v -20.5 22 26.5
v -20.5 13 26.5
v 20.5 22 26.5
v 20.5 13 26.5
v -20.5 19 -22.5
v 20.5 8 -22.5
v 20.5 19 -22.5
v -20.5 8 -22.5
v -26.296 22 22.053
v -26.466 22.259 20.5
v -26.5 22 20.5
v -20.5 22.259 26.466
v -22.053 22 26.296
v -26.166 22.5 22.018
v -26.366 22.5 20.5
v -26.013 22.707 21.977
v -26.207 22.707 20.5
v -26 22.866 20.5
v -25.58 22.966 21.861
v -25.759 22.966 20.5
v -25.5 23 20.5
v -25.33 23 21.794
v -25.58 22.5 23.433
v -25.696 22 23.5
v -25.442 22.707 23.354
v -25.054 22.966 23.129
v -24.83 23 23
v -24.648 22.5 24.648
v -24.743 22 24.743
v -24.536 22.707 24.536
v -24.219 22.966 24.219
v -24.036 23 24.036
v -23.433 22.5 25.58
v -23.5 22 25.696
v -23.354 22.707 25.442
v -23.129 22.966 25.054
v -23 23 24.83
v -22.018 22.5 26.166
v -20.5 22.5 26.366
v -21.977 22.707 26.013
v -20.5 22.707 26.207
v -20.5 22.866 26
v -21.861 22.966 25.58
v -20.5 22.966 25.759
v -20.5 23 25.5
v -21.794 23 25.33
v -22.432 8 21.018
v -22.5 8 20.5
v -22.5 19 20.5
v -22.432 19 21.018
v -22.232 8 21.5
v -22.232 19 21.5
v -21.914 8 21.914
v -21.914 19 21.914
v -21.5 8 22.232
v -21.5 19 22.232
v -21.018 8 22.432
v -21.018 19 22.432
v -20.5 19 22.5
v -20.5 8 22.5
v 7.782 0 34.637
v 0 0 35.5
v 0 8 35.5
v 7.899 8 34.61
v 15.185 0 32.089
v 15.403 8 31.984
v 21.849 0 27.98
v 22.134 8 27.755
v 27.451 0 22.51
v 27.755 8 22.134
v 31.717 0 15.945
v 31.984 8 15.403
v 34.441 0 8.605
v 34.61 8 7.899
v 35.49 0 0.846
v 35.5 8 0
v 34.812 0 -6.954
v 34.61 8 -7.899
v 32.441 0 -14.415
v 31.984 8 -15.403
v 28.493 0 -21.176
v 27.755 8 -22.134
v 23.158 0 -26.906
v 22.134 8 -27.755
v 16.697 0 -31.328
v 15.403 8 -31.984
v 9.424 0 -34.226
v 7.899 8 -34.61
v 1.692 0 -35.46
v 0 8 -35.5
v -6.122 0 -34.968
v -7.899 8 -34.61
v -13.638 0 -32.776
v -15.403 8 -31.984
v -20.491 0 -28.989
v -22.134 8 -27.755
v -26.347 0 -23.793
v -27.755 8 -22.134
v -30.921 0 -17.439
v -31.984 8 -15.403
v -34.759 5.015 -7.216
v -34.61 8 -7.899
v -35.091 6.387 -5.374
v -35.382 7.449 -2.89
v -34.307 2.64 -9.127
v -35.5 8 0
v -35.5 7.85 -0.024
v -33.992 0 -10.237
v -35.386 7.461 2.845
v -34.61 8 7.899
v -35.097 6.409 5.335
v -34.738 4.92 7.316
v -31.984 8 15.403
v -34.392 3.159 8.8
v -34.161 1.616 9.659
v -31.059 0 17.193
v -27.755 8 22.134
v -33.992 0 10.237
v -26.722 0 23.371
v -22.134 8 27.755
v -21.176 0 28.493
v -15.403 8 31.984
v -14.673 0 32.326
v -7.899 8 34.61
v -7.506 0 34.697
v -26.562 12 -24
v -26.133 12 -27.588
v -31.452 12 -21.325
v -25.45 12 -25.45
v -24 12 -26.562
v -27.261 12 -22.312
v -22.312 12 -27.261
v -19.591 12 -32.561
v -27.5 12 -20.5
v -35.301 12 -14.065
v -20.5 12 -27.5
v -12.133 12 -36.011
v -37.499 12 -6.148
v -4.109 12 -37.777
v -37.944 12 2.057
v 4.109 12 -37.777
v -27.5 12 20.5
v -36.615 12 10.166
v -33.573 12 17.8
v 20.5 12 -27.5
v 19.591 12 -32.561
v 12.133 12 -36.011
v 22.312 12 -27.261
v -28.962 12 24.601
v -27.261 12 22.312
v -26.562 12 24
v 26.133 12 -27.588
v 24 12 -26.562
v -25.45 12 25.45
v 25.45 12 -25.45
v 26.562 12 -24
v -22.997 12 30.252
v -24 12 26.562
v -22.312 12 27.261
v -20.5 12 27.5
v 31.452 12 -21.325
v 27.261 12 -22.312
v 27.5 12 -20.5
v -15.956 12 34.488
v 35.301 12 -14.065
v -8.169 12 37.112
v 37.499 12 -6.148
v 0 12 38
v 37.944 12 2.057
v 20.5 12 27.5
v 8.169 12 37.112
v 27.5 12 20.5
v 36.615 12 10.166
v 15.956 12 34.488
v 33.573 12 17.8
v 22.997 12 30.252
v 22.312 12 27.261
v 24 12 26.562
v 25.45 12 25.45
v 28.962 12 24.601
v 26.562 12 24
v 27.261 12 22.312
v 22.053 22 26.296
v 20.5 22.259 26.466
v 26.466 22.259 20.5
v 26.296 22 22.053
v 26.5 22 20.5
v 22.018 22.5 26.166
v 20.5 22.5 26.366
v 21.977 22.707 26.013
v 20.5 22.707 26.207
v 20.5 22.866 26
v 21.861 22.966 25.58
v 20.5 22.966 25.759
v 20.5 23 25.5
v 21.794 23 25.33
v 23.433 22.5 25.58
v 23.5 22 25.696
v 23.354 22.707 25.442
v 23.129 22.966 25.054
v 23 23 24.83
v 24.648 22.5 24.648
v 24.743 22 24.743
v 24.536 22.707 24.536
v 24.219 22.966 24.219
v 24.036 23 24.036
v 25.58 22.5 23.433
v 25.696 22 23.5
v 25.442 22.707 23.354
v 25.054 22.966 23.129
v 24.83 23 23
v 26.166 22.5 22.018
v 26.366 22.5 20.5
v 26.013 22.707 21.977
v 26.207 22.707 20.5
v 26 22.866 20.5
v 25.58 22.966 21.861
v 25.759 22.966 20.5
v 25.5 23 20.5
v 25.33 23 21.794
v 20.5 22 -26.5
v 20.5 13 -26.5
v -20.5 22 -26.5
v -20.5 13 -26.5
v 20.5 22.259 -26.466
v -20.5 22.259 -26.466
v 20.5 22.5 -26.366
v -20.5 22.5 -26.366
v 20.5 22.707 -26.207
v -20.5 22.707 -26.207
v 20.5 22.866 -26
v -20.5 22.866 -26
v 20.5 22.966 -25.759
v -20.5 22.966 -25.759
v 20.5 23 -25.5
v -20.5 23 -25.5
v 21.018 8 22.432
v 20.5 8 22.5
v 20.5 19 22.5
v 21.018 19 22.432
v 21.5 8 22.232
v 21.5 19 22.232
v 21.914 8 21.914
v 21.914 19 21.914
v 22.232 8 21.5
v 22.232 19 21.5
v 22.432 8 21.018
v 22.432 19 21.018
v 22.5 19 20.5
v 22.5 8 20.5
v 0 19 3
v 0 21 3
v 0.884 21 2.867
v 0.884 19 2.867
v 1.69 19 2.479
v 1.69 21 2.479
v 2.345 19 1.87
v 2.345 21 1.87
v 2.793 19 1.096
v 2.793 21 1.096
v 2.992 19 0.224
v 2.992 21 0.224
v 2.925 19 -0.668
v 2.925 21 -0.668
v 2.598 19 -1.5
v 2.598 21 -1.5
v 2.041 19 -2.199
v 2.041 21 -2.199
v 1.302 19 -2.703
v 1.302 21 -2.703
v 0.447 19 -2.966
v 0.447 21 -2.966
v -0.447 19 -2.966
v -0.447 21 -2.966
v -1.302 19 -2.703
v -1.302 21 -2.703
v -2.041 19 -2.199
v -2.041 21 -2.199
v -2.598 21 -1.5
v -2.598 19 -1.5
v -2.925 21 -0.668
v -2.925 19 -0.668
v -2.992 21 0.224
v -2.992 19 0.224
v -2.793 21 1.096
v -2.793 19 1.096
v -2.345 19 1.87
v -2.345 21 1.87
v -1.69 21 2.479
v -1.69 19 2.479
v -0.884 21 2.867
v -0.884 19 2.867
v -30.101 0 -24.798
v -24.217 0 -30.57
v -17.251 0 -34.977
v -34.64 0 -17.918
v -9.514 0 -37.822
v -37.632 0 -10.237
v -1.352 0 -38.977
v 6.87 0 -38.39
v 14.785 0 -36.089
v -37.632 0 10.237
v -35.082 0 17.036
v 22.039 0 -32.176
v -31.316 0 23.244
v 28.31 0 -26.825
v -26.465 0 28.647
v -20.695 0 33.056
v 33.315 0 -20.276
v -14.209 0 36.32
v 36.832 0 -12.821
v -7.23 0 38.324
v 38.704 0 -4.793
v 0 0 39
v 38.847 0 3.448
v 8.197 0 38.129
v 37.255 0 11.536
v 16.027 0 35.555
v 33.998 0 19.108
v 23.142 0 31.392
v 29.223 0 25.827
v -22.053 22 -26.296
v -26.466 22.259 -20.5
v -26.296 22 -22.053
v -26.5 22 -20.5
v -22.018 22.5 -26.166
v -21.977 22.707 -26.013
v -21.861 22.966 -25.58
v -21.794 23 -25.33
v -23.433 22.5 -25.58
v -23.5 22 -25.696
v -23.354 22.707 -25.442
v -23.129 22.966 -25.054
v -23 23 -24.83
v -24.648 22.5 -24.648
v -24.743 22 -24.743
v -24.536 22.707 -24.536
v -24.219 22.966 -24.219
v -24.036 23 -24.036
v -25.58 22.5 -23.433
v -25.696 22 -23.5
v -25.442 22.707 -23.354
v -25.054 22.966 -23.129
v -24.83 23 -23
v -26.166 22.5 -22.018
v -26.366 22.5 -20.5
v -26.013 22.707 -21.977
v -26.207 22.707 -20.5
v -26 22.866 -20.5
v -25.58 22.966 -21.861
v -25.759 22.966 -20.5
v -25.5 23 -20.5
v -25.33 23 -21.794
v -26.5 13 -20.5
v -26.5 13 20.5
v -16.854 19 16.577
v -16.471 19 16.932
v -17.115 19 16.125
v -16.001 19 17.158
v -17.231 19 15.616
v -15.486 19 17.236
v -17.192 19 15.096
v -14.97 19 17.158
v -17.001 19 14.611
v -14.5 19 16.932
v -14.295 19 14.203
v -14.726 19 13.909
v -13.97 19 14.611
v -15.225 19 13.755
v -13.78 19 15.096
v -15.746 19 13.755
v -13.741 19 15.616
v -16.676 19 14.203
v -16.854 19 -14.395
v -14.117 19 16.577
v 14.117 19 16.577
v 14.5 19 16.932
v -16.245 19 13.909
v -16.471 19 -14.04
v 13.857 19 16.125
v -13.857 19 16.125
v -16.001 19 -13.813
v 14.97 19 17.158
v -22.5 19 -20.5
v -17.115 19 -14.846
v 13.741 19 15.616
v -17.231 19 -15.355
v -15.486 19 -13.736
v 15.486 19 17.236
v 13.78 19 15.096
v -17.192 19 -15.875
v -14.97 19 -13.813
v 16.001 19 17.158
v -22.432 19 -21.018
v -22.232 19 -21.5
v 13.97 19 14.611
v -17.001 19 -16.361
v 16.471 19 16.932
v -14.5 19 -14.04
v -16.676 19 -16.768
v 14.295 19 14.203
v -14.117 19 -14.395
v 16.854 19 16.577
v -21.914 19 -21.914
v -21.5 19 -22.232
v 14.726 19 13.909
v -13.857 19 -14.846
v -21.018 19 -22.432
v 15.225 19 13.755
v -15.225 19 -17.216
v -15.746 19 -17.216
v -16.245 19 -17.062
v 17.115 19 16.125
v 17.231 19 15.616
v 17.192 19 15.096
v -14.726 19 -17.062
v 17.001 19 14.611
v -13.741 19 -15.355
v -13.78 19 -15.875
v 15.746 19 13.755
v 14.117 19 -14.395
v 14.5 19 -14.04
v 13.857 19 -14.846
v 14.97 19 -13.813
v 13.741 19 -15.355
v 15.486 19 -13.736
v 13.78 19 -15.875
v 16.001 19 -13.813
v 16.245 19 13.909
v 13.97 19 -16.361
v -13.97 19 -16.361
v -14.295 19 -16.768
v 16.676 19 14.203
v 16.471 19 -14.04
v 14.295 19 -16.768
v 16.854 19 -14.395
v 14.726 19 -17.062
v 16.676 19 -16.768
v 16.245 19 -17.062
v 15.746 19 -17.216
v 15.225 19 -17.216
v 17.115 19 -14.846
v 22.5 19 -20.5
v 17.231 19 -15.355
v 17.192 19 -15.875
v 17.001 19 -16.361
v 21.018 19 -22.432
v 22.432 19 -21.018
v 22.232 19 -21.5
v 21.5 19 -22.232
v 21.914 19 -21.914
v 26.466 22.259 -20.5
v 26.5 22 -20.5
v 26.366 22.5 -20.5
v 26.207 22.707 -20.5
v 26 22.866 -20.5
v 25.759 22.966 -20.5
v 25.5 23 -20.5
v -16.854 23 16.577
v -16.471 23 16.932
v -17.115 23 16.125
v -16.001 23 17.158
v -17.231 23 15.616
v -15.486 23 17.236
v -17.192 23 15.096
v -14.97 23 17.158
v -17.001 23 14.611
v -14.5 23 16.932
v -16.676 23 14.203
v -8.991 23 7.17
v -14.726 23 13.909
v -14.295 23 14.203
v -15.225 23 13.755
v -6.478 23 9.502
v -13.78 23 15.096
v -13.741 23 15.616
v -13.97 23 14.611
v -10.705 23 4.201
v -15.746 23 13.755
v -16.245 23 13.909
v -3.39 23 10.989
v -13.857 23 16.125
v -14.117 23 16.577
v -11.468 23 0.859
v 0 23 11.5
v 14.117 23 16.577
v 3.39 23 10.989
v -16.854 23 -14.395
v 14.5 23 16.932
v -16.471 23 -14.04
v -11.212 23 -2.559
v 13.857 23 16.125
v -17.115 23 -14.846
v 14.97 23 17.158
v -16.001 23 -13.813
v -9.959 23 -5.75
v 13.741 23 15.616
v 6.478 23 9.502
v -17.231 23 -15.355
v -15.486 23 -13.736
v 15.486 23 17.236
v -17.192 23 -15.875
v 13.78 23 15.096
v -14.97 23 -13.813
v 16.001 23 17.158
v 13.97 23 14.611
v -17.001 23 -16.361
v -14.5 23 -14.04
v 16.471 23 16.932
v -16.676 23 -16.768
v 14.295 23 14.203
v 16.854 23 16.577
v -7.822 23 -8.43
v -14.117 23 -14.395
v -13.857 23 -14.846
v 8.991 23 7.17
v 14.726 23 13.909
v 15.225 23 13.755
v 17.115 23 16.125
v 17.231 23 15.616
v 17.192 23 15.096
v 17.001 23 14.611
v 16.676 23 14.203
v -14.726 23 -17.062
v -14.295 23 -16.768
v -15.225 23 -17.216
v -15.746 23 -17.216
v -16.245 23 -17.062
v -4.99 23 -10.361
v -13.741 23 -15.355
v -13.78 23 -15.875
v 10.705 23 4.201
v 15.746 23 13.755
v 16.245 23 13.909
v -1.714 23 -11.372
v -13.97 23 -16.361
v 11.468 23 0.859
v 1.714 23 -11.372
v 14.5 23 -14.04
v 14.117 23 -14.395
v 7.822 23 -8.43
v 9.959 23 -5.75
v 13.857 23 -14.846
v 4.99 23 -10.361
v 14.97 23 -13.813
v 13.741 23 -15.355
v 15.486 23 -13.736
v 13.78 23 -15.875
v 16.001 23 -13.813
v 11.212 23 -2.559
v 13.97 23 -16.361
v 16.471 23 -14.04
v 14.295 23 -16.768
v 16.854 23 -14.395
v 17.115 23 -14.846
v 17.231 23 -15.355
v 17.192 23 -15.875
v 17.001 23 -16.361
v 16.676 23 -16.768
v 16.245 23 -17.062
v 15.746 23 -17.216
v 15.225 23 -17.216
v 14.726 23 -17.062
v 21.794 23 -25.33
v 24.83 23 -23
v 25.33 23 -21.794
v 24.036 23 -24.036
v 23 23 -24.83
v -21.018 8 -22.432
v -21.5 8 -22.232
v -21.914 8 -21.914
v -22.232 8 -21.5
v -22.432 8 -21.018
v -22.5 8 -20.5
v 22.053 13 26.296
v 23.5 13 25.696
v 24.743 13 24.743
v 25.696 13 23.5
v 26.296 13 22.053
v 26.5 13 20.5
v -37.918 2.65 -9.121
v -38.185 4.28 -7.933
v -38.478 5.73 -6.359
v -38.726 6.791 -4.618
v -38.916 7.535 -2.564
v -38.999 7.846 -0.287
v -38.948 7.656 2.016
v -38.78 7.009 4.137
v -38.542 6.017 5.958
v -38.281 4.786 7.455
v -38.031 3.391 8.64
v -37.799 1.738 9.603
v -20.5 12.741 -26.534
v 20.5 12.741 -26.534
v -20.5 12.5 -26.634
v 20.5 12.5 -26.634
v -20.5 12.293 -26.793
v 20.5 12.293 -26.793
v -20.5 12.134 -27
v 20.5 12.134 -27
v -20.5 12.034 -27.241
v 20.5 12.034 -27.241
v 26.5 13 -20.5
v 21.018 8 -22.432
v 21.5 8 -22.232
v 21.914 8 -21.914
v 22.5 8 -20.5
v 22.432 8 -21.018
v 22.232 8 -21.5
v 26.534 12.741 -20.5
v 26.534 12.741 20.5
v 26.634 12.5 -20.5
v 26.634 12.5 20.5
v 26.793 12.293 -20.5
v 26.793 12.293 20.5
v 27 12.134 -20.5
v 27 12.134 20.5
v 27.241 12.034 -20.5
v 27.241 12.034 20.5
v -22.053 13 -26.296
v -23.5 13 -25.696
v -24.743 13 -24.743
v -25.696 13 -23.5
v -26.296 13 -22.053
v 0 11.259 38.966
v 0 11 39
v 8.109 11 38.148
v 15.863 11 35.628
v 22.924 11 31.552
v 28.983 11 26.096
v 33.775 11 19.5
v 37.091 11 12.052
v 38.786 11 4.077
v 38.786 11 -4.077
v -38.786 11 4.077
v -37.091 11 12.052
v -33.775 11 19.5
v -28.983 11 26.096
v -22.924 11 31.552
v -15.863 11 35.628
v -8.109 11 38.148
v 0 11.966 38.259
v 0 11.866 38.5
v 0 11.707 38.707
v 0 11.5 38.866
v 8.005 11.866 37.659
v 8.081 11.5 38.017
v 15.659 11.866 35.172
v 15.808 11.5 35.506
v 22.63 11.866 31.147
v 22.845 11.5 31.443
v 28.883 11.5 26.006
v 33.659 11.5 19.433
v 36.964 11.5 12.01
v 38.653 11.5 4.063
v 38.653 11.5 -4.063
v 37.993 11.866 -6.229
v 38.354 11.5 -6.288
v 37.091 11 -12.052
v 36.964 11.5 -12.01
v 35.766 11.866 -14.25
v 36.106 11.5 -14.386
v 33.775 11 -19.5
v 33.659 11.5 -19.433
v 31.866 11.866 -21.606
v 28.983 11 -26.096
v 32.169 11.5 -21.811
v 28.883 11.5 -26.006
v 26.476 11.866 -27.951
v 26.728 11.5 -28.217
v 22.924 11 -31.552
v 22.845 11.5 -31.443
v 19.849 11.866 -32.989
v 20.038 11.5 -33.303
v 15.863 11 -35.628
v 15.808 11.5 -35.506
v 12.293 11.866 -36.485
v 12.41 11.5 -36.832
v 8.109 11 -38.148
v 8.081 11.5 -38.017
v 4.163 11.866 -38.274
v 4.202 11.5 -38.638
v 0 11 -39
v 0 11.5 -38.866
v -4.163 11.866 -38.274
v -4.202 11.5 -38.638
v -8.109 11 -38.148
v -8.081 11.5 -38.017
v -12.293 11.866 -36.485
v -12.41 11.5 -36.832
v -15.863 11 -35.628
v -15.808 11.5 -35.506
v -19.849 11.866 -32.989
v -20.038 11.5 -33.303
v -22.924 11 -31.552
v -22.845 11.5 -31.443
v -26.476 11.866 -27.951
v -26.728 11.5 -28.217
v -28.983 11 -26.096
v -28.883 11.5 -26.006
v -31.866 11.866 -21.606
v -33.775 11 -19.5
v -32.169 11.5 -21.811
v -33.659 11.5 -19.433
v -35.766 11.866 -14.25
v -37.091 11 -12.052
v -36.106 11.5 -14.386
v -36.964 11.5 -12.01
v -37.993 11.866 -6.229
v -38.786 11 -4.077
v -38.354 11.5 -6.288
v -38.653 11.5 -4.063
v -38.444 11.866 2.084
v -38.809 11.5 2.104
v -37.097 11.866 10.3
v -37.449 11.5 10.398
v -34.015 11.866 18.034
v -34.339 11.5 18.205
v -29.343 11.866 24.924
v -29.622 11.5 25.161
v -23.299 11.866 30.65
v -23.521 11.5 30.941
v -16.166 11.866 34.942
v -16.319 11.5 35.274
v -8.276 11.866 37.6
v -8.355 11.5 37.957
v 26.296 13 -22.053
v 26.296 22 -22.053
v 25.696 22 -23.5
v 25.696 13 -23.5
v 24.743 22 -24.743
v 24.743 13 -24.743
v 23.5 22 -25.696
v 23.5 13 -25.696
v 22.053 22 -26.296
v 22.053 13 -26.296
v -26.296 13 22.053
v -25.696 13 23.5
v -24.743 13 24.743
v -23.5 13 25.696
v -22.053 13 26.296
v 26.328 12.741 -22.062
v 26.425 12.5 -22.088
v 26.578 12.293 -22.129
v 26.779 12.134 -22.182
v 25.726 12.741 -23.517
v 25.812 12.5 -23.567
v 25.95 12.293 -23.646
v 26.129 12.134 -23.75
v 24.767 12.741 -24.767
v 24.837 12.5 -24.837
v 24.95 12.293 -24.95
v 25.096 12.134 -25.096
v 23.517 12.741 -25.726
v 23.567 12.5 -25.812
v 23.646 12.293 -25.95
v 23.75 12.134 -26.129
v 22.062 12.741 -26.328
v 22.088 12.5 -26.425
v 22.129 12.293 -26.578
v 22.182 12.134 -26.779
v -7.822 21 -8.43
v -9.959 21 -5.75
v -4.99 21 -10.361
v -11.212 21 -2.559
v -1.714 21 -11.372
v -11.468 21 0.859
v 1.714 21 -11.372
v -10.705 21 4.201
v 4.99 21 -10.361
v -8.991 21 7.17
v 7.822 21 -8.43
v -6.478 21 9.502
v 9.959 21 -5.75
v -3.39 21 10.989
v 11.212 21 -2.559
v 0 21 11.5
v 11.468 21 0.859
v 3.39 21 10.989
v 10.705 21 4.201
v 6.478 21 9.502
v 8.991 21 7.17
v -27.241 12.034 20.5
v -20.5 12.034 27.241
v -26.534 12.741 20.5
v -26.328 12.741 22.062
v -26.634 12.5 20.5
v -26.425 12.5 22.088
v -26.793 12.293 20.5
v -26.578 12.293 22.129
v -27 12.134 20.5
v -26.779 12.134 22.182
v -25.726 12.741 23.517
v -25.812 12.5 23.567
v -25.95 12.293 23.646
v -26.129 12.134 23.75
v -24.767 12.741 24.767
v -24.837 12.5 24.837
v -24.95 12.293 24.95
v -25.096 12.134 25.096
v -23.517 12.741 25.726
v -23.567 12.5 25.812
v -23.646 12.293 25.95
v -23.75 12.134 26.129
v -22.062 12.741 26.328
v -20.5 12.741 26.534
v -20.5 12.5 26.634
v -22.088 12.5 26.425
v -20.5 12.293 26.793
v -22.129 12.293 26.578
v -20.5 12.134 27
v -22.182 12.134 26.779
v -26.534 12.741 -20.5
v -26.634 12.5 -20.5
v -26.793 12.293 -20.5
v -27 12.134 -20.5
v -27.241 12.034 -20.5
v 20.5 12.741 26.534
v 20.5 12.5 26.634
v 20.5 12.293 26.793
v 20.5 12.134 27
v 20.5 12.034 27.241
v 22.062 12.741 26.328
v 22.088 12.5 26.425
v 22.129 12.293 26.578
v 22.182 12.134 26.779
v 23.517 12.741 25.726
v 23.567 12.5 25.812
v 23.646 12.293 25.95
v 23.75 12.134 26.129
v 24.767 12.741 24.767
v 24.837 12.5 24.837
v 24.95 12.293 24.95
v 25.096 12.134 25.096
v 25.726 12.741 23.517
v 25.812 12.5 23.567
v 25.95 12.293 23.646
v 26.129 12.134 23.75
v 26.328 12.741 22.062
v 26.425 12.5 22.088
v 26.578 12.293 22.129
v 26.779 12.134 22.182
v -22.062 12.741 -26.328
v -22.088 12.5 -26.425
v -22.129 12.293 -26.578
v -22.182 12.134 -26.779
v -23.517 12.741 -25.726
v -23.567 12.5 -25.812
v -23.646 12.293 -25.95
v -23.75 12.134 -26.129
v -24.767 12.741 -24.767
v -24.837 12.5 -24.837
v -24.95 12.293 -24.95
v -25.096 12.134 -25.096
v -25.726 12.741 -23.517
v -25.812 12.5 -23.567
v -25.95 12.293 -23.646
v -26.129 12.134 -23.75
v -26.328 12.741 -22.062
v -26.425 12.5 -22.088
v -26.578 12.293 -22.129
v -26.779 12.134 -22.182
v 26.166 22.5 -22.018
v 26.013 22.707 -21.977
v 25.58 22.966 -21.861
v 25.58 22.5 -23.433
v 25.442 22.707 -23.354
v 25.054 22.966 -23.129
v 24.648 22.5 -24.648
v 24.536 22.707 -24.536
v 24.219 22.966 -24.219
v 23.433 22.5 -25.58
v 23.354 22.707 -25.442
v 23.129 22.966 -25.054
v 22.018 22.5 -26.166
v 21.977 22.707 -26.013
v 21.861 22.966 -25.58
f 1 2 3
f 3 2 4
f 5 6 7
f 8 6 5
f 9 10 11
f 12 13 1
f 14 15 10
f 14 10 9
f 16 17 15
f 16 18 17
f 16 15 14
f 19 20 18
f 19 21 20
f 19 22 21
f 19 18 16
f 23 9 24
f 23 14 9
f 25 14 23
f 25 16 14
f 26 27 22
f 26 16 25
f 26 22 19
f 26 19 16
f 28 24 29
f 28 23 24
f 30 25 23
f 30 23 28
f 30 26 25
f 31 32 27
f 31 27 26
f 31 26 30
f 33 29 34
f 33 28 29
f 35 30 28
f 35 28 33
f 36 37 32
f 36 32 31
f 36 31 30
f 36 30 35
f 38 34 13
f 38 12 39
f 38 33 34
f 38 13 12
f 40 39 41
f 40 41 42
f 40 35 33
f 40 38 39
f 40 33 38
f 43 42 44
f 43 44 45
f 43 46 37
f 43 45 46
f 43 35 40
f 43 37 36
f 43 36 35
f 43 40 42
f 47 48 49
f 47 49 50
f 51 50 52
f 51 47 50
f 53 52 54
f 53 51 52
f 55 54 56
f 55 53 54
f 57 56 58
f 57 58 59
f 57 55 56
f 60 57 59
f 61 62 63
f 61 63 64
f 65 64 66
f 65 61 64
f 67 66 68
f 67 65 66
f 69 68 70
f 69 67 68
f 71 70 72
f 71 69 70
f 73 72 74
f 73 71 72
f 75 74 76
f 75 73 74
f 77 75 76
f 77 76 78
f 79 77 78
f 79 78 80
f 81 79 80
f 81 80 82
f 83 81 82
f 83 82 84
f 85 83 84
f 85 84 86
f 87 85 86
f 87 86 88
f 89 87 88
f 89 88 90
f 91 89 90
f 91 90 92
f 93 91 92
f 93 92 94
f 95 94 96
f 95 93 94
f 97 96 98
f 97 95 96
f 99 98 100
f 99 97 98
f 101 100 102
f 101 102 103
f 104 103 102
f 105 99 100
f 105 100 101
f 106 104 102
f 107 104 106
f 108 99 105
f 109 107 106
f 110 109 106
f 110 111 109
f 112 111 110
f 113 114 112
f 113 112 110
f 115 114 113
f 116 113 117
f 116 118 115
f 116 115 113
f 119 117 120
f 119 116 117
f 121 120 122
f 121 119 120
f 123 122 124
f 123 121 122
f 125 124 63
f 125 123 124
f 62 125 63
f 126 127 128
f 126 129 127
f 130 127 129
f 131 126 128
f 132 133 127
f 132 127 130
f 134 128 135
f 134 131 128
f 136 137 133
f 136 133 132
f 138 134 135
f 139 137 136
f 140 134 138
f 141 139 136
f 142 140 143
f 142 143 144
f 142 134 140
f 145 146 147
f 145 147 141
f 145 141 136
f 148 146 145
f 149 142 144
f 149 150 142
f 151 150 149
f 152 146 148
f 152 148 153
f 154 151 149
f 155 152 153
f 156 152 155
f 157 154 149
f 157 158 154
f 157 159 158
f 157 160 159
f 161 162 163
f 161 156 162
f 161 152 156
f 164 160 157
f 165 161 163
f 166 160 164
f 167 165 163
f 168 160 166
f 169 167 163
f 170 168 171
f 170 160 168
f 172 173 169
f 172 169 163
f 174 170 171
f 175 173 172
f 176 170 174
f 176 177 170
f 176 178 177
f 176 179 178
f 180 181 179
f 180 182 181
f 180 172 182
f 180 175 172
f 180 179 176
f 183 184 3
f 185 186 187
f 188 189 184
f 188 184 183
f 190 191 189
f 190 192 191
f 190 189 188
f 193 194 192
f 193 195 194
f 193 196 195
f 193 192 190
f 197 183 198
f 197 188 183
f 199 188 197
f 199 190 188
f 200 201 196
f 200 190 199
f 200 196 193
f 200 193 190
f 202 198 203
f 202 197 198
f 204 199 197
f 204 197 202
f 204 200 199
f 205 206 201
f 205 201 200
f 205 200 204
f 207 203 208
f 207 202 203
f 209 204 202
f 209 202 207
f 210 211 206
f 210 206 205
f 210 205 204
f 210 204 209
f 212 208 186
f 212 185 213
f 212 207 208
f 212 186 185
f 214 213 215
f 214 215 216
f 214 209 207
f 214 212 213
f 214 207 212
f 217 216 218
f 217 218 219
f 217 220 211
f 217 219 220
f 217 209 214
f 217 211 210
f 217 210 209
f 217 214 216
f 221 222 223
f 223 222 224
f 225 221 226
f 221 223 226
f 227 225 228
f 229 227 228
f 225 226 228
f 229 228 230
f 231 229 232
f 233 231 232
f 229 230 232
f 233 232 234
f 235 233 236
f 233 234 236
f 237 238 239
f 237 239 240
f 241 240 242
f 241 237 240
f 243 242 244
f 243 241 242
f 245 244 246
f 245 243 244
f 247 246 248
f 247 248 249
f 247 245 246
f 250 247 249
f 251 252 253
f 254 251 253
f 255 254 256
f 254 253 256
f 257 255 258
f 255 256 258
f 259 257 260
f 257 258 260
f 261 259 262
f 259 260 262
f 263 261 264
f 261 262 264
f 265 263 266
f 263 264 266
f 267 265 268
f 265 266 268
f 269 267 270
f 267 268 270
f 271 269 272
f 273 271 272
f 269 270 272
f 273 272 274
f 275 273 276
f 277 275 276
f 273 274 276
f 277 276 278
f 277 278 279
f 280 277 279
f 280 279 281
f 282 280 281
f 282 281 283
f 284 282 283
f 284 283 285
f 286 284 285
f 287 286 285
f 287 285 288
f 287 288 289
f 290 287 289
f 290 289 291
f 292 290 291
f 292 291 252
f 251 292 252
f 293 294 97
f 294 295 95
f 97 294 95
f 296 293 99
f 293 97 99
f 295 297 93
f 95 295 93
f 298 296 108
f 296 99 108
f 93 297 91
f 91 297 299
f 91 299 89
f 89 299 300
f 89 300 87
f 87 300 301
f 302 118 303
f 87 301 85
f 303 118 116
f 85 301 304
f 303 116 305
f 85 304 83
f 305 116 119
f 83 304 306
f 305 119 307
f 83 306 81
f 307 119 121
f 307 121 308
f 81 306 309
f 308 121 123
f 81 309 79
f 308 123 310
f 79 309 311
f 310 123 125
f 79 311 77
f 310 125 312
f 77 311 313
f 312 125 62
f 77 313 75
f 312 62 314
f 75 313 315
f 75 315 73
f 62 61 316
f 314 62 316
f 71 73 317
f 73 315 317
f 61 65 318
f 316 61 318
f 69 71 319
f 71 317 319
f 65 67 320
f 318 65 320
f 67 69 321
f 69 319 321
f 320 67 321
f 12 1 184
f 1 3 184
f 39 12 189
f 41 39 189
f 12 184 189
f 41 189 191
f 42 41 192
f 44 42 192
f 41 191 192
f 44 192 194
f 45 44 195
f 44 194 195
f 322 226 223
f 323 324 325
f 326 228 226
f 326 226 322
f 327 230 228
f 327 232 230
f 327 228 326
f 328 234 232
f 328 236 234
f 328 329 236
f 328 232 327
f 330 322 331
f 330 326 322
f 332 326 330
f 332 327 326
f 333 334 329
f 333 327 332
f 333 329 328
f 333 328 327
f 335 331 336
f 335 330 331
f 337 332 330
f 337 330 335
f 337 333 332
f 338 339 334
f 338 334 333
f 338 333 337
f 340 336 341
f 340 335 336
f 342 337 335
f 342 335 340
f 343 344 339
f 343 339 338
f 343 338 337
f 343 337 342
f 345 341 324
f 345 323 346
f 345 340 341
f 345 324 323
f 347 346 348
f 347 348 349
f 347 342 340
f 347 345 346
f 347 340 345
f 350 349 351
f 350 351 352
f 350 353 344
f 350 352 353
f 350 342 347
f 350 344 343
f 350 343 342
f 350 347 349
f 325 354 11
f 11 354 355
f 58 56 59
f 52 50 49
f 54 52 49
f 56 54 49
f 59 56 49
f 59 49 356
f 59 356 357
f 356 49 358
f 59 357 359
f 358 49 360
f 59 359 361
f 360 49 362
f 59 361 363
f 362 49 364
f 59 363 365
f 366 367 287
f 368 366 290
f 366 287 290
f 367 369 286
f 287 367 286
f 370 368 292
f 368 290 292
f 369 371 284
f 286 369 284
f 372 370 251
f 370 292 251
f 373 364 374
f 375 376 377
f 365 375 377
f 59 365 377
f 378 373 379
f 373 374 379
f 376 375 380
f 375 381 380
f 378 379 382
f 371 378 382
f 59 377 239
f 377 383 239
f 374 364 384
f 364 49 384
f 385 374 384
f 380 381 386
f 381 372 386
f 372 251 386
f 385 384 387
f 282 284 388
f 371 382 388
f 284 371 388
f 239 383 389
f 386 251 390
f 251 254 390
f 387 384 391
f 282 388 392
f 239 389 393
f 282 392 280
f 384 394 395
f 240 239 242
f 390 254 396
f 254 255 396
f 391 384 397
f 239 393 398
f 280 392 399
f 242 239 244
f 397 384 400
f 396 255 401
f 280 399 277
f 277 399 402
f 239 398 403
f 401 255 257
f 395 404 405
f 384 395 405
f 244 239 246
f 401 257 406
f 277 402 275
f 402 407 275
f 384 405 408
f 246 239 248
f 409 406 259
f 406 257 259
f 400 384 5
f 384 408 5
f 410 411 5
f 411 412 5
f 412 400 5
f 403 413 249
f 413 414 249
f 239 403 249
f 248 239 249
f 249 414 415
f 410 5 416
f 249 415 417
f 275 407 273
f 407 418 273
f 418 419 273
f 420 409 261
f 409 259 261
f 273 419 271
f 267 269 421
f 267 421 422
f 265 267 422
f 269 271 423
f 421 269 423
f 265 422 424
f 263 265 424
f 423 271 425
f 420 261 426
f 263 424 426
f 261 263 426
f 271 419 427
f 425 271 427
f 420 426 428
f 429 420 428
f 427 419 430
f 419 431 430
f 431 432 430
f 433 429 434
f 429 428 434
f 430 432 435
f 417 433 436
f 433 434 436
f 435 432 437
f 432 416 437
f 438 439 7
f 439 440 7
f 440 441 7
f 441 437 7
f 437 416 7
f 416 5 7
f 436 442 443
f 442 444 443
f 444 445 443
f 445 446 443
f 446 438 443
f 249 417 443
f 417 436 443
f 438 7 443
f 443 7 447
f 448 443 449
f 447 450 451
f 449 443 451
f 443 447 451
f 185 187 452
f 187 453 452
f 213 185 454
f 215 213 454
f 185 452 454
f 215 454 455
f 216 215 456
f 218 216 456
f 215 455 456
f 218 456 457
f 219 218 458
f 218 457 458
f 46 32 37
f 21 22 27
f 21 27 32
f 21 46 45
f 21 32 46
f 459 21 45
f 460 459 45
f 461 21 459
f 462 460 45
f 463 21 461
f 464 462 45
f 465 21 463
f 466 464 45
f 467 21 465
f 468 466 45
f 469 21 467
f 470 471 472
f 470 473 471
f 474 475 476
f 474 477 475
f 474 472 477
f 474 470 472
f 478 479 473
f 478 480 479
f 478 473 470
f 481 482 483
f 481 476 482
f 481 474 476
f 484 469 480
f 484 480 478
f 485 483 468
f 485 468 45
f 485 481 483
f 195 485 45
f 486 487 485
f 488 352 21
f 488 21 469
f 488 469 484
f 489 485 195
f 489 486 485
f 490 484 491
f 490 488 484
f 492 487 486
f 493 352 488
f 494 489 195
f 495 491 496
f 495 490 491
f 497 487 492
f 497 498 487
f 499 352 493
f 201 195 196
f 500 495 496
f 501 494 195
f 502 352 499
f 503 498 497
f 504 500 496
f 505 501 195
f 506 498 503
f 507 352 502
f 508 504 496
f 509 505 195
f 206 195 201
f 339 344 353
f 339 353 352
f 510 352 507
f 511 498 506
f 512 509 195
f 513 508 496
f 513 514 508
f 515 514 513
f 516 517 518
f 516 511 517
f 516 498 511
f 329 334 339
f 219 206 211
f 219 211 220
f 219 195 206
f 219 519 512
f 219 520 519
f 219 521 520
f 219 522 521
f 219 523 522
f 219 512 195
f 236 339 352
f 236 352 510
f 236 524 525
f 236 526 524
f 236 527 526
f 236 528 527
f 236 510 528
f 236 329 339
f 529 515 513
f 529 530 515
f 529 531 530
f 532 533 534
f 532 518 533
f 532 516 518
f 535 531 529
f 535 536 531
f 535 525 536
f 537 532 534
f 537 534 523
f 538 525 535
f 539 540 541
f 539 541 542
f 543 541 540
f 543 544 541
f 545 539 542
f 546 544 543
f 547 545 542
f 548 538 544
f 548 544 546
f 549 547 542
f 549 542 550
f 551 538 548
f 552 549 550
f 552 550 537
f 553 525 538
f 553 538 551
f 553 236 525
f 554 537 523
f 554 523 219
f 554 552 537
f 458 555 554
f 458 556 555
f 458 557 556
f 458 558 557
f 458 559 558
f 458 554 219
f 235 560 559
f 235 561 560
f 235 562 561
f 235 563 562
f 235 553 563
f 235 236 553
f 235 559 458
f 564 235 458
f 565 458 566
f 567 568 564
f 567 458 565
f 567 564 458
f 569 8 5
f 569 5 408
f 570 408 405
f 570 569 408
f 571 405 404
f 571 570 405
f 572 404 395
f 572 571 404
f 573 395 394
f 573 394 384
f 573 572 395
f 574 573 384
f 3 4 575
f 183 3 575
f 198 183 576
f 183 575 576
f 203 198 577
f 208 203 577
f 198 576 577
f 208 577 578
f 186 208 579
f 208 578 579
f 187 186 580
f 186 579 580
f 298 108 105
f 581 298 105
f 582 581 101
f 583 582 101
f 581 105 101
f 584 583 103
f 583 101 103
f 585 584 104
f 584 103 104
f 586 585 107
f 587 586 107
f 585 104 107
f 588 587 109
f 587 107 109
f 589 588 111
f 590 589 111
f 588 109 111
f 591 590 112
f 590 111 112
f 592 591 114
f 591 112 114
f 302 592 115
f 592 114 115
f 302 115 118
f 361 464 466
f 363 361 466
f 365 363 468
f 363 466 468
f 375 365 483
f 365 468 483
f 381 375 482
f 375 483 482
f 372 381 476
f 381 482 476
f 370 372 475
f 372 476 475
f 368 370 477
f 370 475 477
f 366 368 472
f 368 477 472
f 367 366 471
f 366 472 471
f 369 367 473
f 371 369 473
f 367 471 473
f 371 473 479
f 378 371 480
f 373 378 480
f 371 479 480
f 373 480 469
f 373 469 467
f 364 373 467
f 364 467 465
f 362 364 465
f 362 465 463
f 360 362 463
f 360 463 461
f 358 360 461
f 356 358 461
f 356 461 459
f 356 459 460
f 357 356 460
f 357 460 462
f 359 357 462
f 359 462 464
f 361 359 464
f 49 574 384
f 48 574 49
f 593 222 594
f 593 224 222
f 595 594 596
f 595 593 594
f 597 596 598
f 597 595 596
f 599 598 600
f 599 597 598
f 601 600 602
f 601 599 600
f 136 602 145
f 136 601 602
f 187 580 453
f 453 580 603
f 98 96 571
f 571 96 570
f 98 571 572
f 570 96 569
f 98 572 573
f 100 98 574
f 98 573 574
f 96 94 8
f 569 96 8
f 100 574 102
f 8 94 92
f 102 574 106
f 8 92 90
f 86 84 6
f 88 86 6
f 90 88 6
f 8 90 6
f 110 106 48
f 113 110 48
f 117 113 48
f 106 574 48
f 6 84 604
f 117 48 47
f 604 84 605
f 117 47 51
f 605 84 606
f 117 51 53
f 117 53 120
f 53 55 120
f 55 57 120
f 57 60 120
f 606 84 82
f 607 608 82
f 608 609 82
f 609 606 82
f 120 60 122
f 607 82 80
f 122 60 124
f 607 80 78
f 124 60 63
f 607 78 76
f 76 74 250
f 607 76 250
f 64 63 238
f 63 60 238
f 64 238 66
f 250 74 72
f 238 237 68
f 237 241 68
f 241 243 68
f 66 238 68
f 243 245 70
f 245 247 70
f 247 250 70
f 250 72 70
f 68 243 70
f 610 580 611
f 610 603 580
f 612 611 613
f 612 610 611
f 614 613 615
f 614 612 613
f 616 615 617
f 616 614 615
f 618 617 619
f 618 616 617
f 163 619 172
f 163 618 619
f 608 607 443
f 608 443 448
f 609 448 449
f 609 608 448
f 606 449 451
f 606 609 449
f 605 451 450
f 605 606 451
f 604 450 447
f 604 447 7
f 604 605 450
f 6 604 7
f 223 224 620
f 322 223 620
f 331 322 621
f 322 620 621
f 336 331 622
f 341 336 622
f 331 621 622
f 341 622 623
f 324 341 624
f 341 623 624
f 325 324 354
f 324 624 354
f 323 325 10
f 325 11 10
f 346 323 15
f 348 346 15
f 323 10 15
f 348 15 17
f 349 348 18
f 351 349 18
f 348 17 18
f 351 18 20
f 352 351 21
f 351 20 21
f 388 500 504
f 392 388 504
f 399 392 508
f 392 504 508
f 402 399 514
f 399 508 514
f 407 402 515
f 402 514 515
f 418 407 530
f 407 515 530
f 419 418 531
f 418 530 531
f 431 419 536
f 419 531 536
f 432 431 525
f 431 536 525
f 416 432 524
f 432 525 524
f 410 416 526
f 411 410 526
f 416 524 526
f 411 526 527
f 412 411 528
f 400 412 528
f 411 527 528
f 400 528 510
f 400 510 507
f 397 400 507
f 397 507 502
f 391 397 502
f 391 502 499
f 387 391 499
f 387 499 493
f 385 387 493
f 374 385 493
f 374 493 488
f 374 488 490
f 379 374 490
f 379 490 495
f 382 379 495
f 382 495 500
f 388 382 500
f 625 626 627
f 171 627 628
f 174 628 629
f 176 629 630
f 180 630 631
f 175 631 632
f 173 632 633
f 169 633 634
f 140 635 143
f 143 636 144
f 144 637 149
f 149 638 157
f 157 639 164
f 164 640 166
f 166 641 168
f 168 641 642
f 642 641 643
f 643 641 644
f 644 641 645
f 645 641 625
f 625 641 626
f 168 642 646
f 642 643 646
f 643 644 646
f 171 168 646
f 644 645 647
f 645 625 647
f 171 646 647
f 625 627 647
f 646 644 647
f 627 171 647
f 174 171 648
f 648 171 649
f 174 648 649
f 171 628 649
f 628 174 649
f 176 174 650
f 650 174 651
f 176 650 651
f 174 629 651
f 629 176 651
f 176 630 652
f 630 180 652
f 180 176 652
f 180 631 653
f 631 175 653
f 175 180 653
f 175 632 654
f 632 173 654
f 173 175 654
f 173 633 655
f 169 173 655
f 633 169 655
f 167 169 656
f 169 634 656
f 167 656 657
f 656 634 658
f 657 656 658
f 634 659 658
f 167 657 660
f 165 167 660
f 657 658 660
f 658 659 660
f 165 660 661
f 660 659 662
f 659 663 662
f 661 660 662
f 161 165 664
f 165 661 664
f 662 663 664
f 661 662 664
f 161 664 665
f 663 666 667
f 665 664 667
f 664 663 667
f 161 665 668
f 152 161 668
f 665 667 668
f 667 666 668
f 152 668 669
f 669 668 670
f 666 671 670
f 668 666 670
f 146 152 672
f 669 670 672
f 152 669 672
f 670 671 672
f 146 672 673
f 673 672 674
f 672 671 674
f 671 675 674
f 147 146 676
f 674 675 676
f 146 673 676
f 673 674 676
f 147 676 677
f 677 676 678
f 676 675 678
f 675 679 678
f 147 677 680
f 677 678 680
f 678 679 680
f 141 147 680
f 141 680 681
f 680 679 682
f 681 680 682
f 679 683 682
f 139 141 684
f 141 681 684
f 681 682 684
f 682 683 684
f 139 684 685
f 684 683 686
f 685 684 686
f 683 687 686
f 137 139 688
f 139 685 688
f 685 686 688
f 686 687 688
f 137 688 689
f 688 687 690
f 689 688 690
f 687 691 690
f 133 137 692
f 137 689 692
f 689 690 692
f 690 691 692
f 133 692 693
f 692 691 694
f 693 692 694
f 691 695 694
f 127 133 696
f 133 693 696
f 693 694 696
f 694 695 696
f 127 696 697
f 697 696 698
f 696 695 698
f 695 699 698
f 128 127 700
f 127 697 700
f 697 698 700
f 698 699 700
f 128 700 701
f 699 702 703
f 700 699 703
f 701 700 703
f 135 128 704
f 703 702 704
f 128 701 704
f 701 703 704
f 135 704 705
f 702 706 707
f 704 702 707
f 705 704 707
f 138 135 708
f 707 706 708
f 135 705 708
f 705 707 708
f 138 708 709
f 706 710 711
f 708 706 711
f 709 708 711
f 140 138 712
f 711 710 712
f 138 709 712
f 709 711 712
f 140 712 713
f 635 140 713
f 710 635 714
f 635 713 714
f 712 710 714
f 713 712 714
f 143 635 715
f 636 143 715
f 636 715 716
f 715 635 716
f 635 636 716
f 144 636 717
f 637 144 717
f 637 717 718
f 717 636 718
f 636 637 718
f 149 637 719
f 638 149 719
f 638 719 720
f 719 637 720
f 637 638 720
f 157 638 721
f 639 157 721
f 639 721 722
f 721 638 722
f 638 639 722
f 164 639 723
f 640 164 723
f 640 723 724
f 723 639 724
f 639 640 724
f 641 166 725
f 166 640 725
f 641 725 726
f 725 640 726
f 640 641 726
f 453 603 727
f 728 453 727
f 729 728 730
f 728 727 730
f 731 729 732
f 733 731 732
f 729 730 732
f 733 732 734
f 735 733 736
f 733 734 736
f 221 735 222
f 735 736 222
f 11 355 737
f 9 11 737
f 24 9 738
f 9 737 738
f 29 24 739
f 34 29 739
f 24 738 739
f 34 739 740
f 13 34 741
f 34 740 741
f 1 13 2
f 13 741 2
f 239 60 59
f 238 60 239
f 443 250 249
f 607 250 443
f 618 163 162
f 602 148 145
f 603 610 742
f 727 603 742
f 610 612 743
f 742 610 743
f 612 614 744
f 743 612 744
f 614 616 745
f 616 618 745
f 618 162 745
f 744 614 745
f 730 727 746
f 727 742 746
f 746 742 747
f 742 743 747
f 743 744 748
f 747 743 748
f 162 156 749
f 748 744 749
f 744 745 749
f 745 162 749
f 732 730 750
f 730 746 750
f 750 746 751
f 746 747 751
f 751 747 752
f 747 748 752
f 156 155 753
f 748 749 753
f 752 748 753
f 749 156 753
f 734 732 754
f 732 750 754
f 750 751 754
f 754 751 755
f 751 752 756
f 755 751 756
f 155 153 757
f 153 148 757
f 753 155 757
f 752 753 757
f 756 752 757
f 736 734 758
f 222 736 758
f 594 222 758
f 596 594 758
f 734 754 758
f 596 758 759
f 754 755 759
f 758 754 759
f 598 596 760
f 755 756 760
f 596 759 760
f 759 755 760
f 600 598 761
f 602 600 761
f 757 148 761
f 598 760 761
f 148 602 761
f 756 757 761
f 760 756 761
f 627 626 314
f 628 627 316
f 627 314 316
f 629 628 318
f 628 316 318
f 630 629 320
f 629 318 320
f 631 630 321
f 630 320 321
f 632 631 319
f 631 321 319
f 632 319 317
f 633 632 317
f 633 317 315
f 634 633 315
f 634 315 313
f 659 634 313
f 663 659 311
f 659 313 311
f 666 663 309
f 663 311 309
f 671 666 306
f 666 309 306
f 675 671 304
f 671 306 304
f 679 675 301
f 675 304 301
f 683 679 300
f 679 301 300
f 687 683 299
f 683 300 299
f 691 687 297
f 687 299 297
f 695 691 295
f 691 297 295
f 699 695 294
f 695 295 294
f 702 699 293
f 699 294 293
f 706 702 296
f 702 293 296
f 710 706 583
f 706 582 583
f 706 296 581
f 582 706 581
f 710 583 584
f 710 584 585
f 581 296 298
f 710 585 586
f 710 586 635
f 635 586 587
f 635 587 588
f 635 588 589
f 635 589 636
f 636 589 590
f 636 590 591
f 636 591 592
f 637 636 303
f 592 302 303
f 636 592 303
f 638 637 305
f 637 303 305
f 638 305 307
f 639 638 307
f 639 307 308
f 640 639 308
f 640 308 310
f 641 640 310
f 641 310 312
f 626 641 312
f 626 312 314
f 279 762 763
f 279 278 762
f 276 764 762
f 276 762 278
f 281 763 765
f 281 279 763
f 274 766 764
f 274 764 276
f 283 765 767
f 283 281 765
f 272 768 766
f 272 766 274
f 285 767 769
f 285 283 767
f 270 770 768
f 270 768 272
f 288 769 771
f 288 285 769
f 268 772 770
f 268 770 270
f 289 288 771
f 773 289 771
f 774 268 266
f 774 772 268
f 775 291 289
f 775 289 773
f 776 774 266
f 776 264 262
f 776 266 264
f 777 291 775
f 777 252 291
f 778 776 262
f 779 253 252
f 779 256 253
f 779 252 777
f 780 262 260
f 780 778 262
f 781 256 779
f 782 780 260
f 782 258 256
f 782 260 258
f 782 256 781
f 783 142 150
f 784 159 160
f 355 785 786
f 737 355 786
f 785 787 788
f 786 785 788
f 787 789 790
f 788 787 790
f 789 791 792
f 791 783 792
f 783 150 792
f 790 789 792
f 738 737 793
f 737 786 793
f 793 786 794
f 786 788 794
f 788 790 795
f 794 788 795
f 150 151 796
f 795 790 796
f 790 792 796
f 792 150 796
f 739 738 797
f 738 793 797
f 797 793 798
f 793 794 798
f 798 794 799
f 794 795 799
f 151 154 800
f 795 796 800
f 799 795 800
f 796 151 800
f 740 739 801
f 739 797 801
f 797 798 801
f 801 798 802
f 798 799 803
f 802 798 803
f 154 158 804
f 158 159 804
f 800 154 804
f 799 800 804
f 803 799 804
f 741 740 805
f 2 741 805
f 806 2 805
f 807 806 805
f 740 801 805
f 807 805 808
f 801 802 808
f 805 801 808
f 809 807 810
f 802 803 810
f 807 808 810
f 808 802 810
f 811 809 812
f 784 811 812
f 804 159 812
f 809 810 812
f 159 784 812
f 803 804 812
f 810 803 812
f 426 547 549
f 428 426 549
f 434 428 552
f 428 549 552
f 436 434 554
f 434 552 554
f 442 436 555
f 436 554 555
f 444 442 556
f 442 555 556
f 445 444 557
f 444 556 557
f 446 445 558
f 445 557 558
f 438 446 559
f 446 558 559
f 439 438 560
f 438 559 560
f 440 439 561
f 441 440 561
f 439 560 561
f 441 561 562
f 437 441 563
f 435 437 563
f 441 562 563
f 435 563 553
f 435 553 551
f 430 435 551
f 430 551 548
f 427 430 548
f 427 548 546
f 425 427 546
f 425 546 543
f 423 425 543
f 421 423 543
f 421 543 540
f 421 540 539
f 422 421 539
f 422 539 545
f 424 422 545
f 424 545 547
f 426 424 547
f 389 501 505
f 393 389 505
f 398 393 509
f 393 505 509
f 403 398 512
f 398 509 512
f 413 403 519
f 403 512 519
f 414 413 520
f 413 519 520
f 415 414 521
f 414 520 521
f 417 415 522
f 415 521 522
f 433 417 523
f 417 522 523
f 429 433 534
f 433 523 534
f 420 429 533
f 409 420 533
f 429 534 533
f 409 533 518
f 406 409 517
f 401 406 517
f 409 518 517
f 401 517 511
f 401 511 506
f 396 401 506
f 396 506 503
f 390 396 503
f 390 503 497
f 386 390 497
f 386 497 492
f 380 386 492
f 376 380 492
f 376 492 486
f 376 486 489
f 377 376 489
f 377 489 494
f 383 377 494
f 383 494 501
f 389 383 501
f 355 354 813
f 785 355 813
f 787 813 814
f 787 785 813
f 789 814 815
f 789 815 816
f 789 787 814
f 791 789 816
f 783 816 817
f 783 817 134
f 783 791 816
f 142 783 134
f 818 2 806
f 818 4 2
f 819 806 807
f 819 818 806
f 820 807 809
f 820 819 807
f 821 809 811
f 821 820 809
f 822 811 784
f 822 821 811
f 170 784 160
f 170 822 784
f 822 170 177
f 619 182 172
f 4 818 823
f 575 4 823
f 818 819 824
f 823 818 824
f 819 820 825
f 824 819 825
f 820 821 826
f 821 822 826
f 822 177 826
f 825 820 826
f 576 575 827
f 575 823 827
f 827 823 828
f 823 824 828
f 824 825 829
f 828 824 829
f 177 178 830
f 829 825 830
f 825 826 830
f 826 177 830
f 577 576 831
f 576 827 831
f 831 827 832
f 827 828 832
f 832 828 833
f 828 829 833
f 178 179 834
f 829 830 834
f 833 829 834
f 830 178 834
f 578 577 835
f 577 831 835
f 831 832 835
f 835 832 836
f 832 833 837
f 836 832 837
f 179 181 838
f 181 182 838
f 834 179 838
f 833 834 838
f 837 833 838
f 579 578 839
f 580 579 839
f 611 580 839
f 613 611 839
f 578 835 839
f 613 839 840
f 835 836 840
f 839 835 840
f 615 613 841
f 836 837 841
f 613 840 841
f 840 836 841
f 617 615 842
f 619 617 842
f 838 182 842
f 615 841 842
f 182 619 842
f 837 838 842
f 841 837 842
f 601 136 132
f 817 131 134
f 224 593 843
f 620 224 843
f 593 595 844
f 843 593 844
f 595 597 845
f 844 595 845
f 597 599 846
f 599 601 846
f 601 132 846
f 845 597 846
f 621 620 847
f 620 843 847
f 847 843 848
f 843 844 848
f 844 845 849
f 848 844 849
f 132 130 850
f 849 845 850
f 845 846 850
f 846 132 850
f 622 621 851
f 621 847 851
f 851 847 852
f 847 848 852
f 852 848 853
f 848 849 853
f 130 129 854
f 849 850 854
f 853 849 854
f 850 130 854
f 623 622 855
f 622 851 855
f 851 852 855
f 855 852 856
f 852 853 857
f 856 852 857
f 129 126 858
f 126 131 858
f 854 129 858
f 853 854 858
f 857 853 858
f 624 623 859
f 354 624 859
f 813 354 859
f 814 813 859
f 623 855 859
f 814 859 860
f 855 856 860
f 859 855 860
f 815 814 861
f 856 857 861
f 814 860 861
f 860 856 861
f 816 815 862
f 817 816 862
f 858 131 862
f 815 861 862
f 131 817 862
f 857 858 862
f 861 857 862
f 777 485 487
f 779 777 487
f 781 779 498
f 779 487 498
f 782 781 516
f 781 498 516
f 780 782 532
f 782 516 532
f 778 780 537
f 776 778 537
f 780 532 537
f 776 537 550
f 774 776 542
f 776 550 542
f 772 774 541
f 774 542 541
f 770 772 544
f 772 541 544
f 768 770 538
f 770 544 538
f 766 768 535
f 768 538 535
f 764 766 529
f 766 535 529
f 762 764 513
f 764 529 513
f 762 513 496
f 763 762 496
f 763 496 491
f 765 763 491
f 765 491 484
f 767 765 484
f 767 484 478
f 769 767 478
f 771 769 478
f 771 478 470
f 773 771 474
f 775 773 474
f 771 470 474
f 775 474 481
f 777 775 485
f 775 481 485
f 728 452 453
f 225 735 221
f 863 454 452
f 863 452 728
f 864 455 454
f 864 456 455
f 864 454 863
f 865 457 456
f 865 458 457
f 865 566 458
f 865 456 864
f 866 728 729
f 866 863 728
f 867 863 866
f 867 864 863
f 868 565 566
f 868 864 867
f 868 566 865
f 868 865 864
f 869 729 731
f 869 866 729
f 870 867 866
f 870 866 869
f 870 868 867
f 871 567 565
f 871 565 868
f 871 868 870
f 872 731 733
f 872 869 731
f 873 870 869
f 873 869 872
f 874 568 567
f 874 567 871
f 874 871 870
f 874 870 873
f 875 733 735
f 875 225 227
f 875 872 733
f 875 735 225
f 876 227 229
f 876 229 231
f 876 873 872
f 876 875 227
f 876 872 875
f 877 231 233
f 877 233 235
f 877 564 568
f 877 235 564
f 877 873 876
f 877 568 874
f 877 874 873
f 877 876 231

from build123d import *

# Parameters (mm, degrees)
SKETCH1_R           = 39
SKETCH1_R_2         = 35.5
BOSS_EXTRUDE1_DEPTH = 8
SKETCH2_R           = 39
BOSS_EXTRUDE2_DEPTH = 4
BOSS_EXTRUDE3_DEPTH = 7
BOSS_EXTRUDE4_DEPTH = 4
SKETCH5_R           = 11.5
CUT_EXTRUDE1_DEPTH  = 2
SKETCH6_R           = 1.75
SKETCH6_R_2         = 3
CUT_EXTRUDE2_DEPTH  = 60.757844673
FILLET1_R           = 1
FILLET2_R           = 1
SKETCH7_R           = 10.6
CUT_EXTRUDE3_DEPTH  = 50


with BuildPart() as part:
    # Sketch1 → Boss-Extrude1 (new body)
    with BuildSketch(Plane(origin=(0, 0, 0), x_dir=(1, 0, 0), z_dir=(0, 1, 0))):
        with Locations(Location((0, 0, 0), (0, 0, 270))):
            Circle(SKETCH1_R)
        with Locations(Location((0, 0, 0), (0, 0, 270))):
            Circle(SKETCH1_R_2, mode=Mode.SUBTRACT)
    extrude(amount=BOSS_EXTRUDE1_DEPTH)

    # Sketch2 → Boss-Extrude2 (add)
    with BuildSketch(Plane(origin=(0, 8, 0), x_dir=(1, 0, 0), z_dir=(0, 1, 0))):
        with Locations(Location((0, 0, 0), (0, 0, 270))):
            Circle(SKETCH2_R)
        with BuildLine():
            Line((-20.5, -22.5), (20.5, -22.5))
            ThreePointArc((20.5, -22.5), (21.914213562, -21.914213562), (22.5, -20.5))
            Line((22.5, -20.5), (22.5, 20.5))
            ThreePointArc((22.5, 20.5), (21.914213562, 21.914213562), (20.5, 22.5))
            Line((20.5, 22.5), (-20.5, 22.5))
            ThreePointArc((-20.5, 22.5), (-21.914213562, 21.914213562), (-22.5, 20.5))
            Line((-22.5, 20.5), (-22.5, -20.5))
            ThreePointArc((-22.5, -20.5), (-21.914213562, -21.914213562), (-20.5, -22.5))
        make_face(mode=Mode.SUBTRACT)
    extrude(amount=BOSS_EXTRUDE2_DEPTH)

    # Sketch3 → Boss-Extrude3 (add)
    with BuildSketch(Plane(origin=(0, 12, 0), x_dir=(1, 0, 0), z_dir=(0, 1, 0))):
        with BuildLine():
            Line((-20.5, -26.5), (20.5, -26.5))
            ThreePointArc((20.5, -26.5), (24.742640687, -24.742640687), (26.5, -20.5))
            Line((26.5, -20.5), (26.5, 20.5))
            ThreePointArc((26.5, 20.5), (24.742640687, 24.742640687), (20.5, 26.5))
            Line((20.5, 26.5), (-20.5, 26.5))
            ThreePointArc((-20.5, 26.5), (-24.742640687, 24.742640687), (-26.5, 20.5))
            Line((-26.5, 20.5), (-26.5, -20.5))
            ThreePointArc((-26.5, -20.5), (-24.742640687, -24.742640687), (-20.5, -26.5))
        make_face()
        with BuildLine():
            Line((-20.5, -22.5), (20.5, -22.5))
            ThreePointArc((20.5, -22.5), (21.914213562, -21.914213562), (22.5, -20.5))
            Line((22.5, -20.5), (22.5, 20.5))
            ThreePointArc((22.5, 20.5), (21.914213562, 21.914213562), (20.5, 22.5))
            Line((20.5, 22.5), (-20.5, 22.5))
            ThreePointArc((-20.5, 22.5), (-21.914213562, 21.914213562), (-22.5, 20.5))
            Line((-22.5, 20.5), (-22.5, -20.5))
            ThreePointArc((-22.5, -20.5), (-21.914213562, -21.914213562), (-20.5, -22.5))
        make_face(mode=Mode.SUBTRACT)
    extrude(amount=BOSS_EXTRUDE3_DEPTH)

    # Sketch4 → Boss-Extrude4 (add)
    with BuildSketch(Plane(origin=(0, 19, 0), x_dir=(1, 0, 0), z_dir=(0, 1, 0))):
        with BuildLine():
            Line((-20.5, -26.5), (20.5, -26.5))
            ThreePointArc((20.5, -26.5), (24.742640687, -24.742640687), (26.5, -20.5))
            Line((26.5, -20.5), (26.5, 20.5))
            ThreePointArc((26.5, 20.5), (24.742640687, 24.742640687), (20.5, 26.5))
            Line((20.5, 26.5), (-20.5, 26.5))
            ThreePointArc((-20.5, 26.5), (-24.742640687, 24.742640687), (-26.5, 20.5))
            Line((-26.5, 20.5), (-26.5, -20.5))
            ThreePointArc((-26.5, -20.5), (-24.742640687, -24.742640687), (-20.5, -26.5))
        make_face()
    extrude(amount=BOSS_EXTRUDE4_DEPTH)

    # Sketch5 → Cut-Extrude1 (cut)
    with BuildSketch(Plane(origin=(0, 23, 0), x_dir=(1, 0, 0), z_dir=(0, 1, 0))):
        with Locations(Location((0, 0, 0), (0, 0, 270))):
            Circle(SKETCH5_R)
    extrude(amount=-CUT_EXTRUDE1_DEPTH, mode=Mode.SUBTRACT)

    # Sketch6 → Cut-Extrude2 (cut, through all)
    with BuildSketch(Plane(origin=(0, 23, 0), x_dir=(1, 0, 0), z_dir=(0, 1, 0))):
        with Locations(Location((-15.485638508, 15.485638508, 0), (0, 0, 270))):
            Circle(SKETCH6_R)
        with Locations(Location((15.485638508, 15.485638508, 0), (0, 0, 270))):
            Circle(SKETCH6_R)
        with Locations(Location((15.485638508, -15.485638508, 0), (0, 0, 270))):
            Circle(SKETCH6_R)
        with Locations(Location((-15.485638508, -15.485638508, 0), (0, 0, 270))):
            Circle(SKETCH6_R)
        with Locations(Location((0, 0, 0), (0, 0, 270))):
            Circle(SKETCH6_R_2)
    extrude(amount=-CUT_EXTRUDE2_DEPTH, mode=Mode.SUBTRACT)

    # Fillet1
    fillet1_edges = [part.edges().sort_by_distance(p)[0] for p in [
        (-24.742640687, 12, 24.742640687),
        (0, 12, 26.5),
        (24.742640687, 12, 24.742640687),
        (26.5, 12, 0),
        (24.742640687, 12, -24.742640687),
        (0, 12, -26.5),
        (-24.742640687, 12, -24.742640687),
        (-26.5, 12, 0),
        (0, 12, -39),
    ]]
    fillet(fillet1_edges, radius=FILLET1_R)

    # Fillet2
    fillet2_edges = [part.edges().sort_by_distance(p)[0] for p in [
        (-24.742640687, 23, 24.742640687),
        (0, 23, 26.5),
        (24.742640687, 23, 24.742640687),
        (26.5, 23, 0),
        (24.742640687, 23, -24.742640687),
        (0, 23, -26.5),
        (-24.742640687, 23, -24.742640687),
        (-26.5, 23, 0),
    ]]
    fillet(fillet2_edges, radius=FILLET2_R)

    # Sketch7 → Cut-Extrude3 (cut)
    with BuildSketch(Plane(origin=(0, 0, 0), x_dir=(0, 0, -1), z_dir=(1, 0, 0))):
        with Locations((0, -2.75)):
            Circle(SKETCH7_R)
    extrude(amount=-CUT_EXTRUDE3_DEPTH, mode=Mode.SUBTRACT)


solid = part.part
